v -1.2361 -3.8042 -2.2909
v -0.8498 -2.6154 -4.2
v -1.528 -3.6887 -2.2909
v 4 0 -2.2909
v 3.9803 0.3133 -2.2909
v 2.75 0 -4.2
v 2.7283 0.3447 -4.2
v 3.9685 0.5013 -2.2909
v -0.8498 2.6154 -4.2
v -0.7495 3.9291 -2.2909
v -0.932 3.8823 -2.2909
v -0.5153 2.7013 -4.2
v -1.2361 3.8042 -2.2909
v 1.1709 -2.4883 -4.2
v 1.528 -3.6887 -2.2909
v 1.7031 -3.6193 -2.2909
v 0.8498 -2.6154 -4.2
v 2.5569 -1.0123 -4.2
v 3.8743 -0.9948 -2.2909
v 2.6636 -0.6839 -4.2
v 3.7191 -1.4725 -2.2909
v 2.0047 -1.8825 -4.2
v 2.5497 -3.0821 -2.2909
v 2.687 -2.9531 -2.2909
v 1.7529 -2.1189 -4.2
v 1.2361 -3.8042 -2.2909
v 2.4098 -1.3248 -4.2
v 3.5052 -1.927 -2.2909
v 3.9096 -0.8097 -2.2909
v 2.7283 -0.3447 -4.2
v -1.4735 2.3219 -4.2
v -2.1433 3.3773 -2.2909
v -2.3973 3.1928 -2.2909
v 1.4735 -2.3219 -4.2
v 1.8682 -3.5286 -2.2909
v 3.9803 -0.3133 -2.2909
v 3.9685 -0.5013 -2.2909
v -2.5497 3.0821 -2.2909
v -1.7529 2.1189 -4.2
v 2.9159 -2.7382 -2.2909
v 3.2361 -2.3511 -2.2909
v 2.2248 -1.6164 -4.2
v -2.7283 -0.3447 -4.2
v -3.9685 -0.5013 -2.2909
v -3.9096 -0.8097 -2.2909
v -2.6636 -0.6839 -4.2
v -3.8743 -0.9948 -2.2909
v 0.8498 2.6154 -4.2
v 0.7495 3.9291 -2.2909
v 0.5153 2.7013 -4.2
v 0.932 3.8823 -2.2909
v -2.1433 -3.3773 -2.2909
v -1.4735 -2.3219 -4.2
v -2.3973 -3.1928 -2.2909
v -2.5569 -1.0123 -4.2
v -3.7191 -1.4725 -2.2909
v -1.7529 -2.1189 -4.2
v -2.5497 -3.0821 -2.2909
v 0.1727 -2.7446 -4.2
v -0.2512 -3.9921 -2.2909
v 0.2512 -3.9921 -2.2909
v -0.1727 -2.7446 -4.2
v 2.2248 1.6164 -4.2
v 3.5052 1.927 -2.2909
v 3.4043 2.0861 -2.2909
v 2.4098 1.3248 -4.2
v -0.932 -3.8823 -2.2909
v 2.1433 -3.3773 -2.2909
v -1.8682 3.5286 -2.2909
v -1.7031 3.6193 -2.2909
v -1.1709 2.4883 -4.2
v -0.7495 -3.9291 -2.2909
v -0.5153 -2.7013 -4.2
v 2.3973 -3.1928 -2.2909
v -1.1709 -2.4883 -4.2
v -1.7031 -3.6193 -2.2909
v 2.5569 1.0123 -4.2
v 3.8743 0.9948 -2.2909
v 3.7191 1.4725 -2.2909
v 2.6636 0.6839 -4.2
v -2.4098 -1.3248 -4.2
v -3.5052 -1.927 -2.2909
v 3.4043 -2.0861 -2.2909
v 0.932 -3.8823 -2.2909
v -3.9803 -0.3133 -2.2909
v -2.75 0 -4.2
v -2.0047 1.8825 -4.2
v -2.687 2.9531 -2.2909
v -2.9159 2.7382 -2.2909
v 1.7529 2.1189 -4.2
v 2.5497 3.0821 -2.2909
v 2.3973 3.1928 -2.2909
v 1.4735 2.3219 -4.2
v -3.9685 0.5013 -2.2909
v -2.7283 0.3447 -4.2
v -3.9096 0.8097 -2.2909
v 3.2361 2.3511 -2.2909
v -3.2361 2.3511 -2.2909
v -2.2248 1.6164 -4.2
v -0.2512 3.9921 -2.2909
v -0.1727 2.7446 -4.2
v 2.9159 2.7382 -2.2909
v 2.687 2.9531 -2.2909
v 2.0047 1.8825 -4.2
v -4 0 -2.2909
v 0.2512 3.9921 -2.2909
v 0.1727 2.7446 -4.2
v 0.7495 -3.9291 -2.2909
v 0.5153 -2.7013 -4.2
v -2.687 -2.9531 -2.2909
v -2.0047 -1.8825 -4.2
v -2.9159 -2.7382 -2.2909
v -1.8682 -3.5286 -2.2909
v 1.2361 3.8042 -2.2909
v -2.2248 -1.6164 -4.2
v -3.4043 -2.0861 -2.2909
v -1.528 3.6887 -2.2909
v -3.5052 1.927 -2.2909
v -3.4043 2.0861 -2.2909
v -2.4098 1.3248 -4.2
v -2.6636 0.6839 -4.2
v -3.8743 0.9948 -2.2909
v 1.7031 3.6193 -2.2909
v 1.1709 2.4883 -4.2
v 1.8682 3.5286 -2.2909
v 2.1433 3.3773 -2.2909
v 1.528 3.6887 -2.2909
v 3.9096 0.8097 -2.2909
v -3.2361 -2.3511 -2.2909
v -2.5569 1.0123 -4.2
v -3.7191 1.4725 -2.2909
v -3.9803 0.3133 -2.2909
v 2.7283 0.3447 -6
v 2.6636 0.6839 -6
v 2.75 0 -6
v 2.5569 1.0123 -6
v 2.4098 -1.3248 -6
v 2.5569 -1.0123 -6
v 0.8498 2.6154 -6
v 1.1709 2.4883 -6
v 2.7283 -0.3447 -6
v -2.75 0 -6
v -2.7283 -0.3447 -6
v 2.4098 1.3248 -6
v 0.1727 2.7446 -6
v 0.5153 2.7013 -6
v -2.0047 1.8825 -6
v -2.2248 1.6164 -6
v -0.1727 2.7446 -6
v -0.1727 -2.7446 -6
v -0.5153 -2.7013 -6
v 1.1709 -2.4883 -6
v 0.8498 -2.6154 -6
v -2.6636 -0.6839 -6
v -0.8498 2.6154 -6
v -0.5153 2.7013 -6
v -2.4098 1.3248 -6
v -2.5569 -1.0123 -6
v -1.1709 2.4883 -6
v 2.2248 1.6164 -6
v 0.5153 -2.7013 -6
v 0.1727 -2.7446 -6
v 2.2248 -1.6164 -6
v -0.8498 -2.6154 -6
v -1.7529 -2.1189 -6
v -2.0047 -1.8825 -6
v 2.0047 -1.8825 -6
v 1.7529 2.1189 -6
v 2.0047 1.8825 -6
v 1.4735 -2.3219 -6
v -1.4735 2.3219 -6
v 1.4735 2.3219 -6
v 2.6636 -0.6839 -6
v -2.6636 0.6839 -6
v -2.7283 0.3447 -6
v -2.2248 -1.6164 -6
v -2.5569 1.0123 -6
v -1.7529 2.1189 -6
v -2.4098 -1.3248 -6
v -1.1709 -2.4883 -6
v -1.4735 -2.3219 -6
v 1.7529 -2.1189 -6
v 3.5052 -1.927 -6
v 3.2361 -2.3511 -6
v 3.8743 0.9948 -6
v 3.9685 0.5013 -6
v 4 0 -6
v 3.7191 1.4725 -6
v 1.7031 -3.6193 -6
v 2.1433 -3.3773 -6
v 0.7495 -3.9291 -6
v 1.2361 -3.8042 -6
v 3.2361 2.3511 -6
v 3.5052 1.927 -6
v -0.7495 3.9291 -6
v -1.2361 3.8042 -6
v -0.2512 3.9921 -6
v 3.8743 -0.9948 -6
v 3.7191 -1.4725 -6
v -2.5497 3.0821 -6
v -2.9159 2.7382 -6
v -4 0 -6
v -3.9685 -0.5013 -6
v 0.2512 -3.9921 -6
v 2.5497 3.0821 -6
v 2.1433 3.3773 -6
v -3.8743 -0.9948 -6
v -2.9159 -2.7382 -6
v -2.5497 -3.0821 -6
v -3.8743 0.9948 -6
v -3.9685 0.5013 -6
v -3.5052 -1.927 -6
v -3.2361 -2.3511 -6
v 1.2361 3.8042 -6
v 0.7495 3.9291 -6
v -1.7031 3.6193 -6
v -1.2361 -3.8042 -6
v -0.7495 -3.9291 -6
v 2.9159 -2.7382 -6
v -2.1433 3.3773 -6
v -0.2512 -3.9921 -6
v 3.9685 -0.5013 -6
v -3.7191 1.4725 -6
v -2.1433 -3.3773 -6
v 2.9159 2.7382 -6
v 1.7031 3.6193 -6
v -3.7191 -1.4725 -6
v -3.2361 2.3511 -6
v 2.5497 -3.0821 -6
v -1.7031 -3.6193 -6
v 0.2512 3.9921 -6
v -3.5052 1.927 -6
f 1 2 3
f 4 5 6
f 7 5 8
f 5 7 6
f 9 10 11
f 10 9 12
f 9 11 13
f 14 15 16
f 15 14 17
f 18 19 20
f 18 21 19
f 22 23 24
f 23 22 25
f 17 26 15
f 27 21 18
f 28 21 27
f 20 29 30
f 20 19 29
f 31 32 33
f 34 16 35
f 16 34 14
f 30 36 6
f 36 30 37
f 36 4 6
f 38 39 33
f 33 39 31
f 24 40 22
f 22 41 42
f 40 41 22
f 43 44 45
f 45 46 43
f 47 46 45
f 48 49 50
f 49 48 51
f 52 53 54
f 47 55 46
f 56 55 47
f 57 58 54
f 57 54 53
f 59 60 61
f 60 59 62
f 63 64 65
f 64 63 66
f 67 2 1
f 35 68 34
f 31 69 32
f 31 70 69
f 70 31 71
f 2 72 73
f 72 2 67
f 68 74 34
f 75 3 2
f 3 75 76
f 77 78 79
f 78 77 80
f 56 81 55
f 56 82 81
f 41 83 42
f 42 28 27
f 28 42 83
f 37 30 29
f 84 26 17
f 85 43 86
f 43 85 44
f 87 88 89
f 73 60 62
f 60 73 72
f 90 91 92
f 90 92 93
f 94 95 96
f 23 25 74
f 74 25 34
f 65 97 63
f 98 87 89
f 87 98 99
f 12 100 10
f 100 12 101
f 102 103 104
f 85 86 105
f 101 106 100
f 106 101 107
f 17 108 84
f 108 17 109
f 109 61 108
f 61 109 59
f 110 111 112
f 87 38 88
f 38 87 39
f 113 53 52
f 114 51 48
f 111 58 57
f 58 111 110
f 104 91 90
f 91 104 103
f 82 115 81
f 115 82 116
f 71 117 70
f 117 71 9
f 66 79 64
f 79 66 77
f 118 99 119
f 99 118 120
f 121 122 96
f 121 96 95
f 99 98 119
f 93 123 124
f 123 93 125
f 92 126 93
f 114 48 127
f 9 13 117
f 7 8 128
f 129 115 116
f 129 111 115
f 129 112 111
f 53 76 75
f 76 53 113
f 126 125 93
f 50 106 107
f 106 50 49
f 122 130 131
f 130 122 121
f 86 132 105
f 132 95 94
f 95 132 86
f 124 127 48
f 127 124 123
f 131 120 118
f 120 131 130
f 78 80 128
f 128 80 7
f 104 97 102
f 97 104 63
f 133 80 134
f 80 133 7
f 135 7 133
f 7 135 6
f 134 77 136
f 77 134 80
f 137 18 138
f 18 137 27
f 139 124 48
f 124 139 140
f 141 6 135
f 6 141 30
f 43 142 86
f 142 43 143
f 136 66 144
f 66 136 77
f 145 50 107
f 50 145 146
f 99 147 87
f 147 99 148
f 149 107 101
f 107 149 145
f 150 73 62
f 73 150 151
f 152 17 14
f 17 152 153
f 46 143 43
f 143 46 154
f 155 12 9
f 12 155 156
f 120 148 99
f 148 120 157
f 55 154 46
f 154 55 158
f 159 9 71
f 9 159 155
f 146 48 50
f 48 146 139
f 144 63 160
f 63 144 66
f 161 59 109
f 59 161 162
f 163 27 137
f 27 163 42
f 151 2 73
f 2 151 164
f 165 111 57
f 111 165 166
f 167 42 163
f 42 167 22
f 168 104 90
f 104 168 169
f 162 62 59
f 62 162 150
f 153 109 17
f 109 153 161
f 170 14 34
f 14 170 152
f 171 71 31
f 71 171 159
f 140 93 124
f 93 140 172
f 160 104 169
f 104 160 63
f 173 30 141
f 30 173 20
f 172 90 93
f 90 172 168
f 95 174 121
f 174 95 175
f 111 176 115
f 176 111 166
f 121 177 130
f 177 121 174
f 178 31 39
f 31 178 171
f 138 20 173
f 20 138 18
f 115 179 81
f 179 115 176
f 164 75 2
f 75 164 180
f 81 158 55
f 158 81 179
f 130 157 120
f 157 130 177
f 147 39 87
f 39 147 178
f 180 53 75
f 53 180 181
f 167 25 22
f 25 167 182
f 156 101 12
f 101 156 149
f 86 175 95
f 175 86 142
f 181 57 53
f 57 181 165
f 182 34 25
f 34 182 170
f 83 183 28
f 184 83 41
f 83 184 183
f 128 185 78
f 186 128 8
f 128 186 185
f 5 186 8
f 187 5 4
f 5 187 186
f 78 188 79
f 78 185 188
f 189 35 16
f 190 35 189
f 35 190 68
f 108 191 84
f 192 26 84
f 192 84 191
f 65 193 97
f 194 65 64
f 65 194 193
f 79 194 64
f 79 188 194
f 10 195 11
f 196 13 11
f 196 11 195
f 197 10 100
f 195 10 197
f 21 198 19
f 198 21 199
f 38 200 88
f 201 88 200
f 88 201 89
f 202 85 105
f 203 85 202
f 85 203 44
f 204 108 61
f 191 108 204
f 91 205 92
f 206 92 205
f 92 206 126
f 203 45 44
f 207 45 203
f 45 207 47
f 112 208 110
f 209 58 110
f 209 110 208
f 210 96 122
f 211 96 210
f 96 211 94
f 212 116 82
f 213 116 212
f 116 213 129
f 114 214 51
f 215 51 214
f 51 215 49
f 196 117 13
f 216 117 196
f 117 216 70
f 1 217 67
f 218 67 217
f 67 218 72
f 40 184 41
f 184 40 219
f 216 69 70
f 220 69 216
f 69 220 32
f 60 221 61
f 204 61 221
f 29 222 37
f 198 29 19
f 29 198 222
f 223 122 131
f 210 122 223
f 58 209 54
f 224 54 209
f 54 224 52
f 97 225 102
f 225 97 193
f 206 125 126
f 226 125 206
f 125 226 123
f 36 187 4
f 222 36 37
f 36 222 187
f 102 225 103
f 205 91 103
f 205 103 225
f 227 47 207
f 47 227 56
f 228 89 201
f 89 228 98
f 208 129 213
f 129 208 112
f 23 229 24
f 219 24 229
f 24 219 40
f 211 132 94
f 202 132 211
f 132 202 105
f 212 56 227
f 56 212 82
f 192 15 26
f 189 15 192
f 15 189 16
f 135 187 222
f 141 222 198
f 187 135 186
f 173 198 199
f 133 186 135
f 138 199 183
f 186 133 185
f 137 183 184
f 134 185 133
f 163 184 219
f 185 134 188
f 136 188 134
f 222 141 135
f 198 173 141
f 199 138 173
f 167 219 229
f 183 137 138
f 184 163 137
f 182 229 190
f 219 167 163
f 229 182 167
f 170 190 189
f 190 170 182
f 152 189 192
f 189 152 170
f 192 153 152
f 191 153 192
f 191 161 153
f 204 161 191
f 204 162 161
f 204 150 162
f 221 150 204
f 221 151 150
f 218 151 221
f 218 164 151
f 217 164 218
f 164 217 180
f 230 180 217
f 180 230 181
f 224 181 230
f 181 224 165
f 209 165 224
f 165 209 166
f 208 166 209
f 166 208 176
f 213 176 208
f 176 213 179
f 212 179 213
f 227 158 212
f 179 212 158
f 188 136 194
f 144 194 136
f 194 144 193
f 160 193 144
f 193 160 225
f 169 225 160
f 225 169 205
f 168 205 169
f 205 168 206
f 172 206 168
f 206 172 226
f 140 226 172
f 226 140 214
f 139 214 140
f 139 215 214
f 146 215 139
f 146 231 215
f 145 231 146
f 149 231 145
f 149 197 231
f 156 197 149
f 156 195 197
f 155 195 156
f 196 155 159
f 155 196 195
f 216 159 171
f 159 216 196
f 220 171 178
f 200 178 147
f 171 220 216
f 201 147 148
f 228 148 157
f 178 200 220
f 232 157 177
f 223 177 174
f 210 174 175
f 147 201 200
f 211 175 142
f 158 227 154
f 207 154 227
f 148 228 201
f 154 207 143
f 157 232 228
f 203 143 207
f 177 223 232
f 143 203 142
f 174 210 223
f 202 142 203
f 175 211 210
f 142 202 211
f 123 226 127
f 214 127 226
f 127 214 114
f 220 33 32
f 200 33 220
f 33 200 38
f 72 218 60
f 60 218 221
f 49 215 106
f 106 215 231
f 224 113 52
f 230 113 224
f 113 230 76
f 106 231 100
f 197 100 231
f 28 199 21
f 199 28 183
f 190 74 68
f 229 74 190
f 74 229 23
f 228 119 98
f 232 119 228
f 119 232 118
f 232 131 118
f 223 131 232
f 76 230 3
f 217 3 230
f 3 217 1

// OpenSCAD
$fn = 50;

difference() {
	union() {
		translate(v = [0, 0, -6.0]) {
			cylinder(h = 6, r = 4.0);
		}
	}
	union() {
		translate(v = [0, 0, 0]) {
			rotate(a = [0, 0, 0]) {
				difference() {
					union() {
						translate(v = [0, 0, -9.0]) {
							cylinder(h = 9, r = 2.25);
						}
						translate(v = [0, 0, -4.2]) {
							cylinder(h = 4.2, r1 = 2.75, r2 = 5.5);
						}
						translate(v = [0, 0, -9.0]) {
							cylinder(h = 9, r = 2.75);
						}
						translate(v = [0, 0, -9.0]) {
							cylinder(h = 9, r = 2.25);
						}
					}
					union();
				}
			}
		}
	}
}
